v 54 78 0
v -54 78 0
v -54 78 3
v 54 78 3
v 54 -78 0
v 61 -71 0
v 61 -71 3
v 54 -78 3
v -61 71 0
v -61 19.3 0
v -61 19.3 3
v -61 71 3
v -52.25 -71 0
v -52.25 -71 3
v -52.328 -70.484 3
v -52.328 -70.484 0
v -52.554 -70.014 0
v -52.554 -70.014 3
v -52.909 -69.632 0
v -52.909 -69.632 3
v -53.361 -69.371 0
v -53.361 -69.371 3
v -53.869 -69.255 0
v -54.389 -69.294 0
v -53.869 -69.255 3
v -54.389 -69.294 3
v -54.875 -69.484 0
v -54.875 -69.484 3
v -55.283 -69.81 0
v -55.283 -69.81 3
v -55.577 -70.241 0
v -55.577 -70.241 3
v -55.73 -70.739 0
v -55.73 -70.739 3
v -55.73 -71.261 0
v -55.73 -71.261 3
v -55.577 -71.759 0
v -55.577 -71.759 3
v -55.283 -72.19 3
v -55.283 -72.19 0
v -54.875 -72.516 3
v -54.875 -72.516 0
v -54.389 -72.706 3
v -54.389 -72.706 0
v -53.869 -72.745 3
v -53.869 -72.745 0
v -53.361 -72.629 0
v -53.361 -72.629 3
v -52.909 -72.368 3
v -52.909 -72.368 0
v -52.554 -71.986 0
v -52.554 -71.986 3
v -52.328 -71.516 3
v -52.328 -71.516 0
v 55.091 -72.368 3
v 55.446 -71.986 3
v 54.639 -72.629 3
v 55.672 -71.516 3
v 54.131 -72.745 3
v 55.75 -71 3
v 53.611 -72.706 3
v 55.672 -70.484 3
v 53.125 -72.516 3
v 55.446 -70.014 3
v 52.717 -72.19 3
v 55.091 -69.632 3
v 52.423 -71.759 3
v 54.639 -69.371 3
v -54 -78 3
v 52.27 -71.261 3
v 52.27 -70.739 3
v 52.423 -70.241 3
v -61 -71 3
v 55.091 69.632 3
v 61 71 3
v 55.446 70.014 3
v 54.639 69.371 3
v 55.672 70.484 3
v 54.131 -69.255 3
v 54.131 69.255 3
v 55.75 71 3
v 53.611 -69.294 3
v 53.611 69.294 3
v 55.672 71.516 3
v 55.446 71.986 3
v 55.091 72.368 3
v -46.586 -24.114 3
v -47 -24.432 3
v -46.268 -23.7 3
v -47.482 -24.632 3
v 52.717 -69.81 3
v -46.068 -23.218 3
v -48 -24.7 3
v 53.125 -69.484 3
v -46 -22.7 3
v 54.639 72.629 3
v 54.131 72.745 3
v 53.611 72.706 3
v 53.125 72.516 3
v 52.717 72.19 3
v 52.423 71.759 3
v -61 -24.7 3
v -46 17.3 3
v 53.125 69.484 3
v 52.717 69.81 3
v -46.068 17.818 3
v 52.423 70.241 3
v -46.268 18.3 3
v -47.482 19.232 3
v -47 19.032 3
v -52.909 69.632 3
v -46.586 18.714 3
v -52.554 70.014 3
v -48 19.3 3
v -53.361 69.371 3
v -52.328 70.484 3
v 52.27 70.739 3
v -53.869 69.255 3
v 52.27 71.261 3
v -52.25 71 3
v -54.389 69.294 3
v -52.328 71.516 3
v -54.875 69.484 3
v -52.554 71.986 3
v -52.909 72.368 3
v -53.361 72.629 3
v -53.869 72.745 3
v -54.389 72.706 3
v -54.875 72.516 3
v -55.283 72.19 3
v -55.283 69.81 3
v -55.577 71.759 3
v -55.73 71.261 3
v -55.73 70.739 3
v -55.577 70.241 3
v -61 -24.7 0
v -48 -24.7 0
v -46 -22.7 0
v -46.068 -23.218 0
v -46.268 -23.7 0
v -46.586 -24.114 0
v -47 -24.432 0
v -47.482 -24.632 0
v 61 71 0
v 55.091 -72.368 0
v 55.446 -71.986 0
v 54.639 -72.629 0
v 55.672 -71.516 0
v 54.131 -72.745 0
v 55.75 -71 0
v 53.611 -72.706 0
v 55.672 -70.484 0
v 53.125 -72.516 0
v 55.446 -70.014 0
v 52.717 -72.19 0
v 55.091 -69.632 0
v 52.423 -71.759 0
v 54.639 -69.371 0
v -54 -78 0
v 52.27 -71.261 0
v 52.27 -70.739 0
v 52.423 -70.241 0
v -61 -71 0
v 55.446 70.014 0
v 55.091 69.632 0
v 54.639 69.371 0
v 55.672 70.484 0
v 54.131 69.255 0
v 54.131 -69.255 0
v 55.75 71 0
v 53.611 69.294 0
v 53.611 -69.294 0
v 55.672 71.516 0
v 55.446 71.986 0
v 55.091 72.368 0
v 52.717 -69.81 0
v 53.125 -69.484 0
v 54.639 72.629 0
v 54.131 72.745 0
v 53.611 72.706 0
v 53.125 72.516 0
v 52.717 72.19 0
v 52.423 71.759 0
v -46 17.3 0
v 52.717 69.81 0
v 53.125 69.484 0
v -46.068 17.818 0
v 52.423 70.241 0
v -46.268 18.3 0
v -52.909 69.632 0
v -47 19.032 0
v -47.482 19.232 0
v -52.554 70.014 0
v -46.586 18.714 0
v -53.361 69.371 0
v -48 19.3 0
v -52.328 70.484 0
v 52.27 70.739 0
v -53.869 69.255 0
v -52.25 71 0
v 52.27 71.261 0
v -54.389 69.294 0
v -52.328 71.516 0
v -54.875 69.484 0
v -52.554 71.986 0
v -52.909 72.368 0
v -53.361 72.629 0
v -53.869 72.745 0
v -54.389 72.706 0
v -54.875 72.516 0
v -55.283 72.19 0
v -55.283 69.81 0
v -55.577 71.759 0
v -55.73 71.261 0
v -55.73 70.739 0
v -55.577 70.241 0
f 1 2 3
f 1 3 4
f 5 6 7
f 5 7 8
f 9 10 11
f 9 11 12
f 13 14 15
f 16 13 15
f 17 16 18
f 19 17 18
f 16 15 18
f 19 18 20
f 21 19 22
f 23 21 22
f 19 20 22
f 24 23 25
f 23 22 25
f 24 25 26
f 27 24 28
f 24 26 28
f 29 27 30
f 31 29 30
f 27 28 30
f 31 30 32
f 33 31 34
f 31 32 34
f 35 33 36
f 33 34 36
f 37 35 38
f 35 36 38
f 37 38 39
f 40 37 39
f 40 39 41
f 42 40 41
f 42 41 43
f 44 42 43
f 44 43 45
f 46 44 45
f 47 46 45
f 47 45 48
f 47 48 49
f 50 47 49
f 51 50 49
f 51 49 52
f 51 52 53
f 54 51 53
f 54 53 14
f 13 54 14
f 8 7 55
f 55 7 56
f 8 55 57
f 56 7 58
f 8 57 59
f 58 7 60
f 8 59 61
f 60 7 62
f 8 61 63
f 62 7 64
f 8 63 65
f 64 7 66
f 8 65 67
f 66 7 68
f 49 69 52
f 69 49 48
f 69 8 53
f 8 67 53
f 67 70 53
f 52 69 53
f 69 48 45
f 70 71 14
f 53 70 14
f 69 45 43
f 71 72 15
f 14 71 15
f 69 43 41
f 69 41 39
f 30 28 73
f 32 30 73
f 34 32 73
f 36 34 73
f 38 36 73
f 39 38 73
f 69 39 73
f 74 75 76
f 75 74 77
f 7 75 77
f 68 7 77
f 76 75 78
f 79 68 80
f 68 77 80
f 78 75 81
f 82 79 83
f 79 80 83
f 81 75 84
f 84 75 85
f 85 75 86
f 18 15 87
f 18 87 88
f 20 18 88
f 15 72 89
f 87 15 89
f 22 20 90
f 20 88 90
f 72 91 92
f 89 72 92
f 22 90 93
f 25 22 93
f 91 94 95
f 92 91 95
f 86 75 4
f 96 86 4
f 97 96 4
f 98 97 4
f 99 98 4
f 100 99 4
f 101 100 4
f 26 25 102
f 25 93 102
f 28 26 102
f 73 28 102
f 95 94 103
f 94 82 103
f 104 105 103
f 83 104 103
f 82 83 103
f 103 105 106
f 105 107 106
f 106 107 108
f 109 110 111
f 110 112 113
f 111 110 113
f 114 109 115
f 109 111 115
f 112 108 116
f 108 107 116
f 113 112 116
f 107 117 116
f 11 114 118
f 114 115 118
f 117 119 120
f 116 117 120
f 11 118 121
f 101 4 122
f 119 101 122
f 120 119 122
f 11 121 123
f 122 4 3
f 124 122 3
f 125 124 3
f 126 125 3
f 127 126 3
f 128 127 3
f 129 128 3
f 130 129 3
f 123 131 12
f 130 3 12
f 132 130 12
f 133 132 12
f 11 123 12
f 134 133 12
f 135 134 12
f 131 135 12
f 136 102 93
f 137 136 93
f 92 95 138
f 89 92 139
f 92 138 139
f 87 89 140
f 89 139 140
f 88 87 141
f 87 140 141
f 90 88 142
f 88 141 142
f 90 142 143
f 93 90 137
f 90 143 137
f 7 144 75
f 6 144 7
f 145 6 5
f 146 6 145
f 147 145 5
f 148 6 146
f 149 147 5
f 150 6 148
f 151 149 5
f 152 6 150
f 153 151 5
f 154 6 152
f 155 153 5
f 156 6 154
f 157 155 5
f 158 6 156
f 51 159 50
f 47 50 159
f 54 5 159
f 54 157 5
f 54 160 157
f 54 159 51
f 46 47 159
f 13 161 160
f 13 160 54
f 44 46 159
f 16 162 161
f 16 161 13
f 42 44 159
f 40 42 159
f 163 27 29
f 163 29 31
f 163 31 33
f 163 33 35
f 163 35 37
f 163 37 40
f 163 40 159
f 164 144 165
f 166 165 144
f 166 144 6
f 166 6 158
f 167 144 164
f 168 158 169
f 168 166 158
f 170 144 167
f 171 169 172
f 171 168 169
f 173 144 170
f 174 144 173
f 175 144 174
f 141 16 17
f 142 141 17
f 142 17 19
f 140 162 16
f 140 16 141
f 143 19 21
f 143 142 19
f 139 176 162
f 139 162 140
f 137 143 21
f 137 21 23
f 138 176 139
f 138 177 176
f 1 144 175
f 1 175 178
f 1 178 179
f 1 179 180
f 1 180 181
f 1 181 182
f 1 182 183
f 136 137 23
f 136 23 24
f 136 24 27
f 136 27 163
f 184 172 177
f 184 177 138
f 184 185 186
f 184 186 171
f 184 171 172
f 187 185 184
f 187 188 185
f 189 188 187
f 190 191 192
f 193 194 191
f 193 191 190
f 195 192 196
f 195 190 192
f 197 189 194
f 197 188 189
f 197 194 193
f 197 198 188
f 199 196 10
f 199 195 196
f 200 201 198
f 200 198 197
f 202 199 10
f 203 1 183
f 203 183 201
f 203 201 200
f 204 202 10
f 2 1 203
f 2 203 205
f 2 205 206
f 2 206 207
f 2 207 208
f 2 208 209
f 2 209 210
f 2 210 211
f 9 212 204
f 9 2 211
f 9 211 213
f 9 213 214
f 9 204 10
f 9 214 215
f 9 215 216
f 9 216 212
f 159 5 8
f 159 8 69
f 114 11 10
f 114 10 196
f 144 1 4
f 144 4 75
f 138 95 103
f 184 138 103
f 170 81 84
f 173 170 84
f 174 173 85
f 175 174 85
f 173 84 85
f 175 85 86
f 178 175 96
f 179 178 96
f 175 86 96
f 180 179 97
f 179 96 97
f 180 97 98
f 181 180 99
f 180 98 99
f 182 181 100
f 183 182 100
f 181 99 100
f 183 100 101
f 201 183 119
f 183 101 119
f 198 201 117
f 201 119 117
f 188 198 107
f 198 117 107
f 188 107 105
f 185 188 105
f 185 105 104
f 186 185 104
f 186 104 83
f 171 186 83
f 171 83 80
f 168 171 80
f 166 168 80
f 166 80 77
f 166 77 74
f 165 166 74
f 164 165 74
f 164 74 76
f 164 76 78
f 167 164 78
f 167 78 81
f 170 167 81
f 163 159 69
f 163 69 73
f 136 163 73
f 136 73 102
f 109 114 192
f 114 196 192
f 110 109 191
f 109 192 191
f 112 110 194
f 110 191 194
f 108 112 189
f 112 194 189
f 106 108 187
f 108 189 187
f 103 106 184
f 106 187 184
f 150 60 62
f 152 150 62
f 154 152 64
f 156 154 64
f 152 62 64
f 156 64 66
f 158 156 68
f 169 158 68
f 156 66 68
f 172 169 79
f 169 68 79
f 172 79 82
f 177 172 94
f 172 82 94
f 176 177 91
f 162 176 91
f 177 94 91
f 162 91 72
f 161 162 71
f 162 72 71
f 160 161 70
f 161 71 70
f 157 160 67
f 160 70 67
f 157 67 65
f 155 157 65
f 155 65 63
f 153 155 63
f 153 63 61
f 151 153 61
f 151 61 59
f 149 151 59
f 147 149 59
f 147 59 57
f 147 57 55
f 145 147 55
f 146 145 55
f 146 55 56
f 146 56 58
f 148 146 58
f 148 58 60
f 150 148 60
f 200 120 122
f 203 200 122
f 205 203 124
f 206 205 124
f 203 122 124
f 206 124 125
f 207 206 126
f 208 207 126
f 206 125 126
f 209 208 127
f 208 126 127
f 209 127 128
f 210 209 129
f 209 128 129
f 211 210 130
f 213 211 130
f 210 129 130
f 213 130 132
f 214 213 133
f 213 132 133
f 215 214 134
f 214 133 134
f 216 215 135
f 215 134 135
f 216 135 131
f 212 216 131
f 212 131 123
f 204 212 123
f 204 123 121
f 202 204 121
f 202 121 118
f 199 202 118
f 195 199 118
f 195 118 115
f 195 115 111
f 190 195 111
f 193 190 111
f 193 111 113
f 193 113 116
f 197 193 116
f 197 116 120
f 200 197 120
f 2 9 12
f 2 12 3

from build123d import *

# Parameters (mm, degrees)
PAD_DEPTH       = 3
SKETCH005_R     = 1.75
POCKET004_DEPTH = 3.001
SKETCH006_W     = 15
SKETCH006_H     = 44
POCKET_DEPTH    = 3.001
FILLET_R        = 2


with BuildPart() as part:
    # Sketch → Pad (new body)
    with BuildSketch(Plane.XY):
        Polygon((-61, 71), (-54, 78), (54, 78), (61, 71), (61, -71), (54, -78), (-54, -78), (-61, -71), align=None)
    extrude(amount=PAD_DEPTH)

    # Sketch005 → Pocket004 (cut, through all)
    with BuildSketch(Plane.XY.offset(3)):
        with Locations((-54, 71)):
            Circle(SKETCH005_R)
        with Locations((54, 71)):
            Circle(SKETCH005_R)
        with Locations((-54, -71)):
            Circle(SKETCH005_R)
        with Locations((54, -71)):
            Circle(SKETCH005_R)
    extrude(amount=-POCKET004_DEPTH, mode=Mode.SUBTRACT)

    # Sketch006 (on Face5 of Pocket004) → Pocket (cut, through all)
    with BuildSketch(Plane.XY.offset(3)):
        with Locations((-53.5, -2.7)):
            Rectangle(SKETCH006_W, SKETCH006_H)
    extrude(amount=-POCKET_DEPTH, mode=Mode.SUBTRACT)

    # Fillet
    fillet_edges = [part.edges().sort_by_distance(p)[0] for p in [
        (-46, 19.3, 1.5),
        (-46, -24.7, 1.5),
    ]]
    fillet(fillet_edges, radius=FILLET_R)


solid = part.part
